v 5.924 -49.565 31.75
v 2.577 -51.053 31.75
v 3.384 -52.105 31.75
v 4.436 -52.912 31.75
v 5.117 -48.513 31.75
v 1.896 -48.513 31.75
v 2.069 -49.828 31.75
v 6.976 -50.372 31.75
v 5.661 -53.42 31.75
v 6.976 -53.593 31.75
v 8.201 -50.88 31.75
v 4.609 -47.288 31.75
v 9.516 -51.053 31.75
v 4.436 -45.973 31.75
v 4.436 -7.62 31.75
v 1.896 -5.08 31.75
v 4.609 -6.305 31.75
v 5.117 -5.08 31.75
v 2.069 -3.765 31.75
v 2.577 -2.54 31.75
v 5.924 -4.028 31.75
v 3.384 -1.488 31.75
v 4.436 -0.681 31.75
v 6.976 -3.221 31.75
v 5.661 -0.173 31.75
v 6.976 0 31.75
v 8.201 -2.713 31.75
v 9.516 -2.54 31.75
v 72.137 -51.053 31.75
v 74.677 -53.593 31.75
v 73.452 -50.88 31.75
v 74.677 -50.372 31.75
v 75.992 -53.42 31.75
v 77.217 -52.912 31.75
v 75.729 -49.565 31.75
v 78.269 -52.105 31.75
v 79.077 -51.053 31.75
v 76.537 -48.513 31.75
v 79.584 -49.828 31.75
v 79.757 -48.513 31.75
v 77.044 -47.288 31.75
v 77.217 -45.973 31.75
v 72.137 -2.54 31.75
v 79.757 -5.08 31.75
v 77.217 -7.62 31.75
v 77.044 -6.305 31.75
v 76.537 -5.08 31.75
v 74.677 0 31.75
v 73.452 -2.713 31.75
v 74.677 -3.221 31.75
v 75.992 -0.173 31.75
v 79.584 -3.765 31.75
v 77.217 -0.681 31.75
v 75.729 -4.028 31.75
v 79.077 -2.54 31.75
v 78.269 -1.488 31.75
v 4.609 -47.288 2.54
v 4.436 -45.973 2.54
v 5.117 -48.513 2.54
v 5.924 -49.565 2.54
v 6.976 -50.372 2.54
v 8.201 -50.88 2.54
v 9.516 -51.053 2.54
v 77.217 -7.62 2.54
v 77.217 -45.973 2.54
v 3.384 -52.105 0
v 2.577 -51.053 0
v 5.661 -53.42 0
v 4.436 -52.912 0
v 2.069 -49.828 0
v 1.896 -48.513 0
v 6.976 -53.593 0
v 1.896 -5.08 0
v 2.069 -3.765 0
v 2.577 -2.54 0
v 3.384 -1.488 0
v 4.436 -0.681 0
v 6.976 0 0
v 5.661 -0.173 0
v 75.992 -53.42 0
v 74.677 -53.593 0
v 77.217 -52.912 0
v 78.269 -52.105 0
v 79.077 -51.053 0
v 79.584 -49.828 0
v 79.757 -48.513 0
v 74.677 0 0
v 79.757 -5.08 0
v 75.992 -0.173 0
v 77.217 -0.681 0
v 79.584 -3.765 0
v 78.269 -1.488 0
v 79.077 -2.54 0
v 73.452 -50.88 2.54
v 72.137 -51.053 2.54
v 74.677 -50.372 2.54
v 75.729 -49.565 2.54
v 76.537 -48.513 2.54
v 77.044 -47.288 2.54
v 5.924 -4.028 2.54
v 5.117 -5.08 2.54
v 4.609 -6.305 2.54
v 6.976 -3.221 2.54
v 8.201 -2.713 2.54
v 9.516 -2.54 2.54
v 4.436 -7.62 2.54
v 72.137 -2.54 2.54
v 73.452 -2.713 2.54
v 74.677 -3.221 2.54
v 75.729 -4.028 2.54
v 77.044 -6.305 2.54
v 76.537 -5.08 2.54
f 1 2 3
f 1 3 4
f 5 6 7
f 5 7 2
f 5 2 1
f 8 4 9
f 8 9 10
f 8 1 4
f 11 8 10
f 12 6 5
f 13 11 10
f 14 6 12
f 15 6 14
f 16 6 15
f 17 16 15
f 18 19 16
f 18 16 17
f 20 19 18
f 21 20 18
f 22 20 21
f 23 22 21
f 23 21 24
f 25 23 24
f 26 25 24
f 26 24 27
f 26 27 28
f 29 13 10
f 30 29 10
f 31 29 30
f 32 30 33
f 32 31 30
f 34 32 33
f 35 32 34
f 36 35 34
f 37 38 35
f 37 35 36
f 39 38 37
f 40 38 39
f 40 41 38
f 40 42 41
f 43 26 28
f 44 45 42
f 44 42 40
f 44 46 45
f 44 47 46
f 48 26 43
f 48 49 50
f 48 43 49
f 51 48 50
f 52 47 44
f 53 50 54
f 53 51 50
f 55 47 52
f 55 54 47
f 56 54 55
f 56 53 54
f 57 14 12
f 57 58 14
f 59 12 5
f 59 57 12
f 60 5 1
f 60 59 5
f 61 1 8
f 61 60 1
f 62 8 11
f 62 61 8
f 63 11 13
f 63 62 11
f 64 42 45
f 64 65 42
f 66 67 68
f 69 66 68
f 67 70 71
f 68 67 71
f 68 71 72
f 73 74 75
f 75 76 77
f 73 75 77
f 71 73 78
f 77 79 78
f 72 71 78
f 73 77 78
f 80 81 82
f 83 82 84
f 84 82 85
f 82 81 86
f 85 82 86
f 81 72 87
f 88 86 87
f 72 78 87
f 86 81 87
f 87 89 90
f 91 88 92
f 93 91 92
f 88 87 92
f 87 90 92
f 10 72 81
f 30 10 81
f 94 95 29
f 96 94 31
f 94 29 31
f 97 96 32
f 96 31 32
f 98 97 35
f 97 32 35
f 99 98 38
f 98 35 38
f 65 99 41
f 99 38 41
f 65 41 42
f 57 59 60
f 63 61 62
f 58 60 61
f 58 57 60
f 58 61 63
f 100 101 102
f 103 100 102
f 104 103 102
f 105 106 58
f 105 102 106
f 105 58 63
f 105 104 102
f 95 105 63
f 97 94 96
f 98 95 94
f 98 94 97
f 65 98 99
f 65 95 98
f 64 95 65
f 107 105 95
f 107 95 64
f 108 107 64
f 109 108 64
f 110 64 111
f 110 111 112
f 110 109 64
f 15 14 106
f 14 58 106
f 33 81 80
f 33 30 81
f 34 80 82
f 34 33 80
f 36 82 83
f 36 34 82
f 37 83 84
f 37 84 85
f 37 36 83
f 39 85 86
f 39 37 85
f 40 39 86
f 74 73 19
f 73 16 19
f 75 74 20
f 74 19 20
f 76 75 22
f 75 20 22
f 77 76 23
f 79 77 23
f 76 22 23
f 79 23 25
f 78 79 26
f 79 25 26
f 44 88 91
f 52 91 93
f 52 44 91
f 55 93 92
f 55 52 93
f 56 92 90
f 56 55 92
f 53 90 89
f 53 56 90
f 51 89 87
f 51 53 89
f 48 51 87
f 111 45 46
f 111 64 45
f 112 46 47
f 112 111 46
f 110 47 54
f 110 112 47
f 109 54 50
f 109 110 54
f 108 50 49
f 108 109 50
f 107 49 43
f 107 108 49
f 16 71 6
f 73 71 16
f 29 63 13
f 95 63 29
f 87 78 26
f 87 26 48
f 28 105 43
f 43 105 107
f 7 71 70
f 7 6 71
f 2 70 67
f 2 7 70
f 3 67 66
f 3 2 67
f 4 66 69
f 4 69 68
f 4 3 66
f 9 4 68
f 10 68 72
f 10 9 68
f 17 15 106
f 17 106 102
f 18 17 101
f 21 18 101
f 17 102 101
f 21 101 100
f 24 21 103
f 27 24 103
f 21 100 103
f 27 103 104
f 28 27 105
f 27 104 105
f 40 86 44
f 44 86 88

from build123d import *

# Parameters (mm, degrees)
F0_W     = 77.8612360591
F0_H     = 53.5927973688
F1_DEPTH = 31.75
F2_T     = -2.54
F3_R     = 5.08


with BuildPart() as f1:
    # F0 (on Top) → F1 (new body)
    with BuildSketch(Plane.XY):
        with Locations((40.8265881124, -26.7963986844)):
            Rectangle(F0_W, F0_H)
    extrude(amount=F1_DEPTH)

    # F2
    f2_openings = [f1.faces().sort_by_distance(p)[0] for p in [
        (40.826588, -26.796399, 31.75),
    ]]
    offset(amount=F2_T, openings=f2_openings)

    # F3
    f3_edges = [f1.edges().sort_by_distance(p)[0] for p in [
        (1.89597, 0, 15.875),
        (79.757206, 0, 15.875),
        (79.757206, -53.592797, 15.875),
        (1.89597, -53.592797, 15.875),
        (4.43597, -51.052797, 17.145),
        (4.43597, -2.54, 17.145),
        (77.217206, -2.54, 17.145),
        (77.217206, -51.052797, 17.145),
    ]]
    fillet(f3_edges, radius=F3_R)


solid = f1.part
